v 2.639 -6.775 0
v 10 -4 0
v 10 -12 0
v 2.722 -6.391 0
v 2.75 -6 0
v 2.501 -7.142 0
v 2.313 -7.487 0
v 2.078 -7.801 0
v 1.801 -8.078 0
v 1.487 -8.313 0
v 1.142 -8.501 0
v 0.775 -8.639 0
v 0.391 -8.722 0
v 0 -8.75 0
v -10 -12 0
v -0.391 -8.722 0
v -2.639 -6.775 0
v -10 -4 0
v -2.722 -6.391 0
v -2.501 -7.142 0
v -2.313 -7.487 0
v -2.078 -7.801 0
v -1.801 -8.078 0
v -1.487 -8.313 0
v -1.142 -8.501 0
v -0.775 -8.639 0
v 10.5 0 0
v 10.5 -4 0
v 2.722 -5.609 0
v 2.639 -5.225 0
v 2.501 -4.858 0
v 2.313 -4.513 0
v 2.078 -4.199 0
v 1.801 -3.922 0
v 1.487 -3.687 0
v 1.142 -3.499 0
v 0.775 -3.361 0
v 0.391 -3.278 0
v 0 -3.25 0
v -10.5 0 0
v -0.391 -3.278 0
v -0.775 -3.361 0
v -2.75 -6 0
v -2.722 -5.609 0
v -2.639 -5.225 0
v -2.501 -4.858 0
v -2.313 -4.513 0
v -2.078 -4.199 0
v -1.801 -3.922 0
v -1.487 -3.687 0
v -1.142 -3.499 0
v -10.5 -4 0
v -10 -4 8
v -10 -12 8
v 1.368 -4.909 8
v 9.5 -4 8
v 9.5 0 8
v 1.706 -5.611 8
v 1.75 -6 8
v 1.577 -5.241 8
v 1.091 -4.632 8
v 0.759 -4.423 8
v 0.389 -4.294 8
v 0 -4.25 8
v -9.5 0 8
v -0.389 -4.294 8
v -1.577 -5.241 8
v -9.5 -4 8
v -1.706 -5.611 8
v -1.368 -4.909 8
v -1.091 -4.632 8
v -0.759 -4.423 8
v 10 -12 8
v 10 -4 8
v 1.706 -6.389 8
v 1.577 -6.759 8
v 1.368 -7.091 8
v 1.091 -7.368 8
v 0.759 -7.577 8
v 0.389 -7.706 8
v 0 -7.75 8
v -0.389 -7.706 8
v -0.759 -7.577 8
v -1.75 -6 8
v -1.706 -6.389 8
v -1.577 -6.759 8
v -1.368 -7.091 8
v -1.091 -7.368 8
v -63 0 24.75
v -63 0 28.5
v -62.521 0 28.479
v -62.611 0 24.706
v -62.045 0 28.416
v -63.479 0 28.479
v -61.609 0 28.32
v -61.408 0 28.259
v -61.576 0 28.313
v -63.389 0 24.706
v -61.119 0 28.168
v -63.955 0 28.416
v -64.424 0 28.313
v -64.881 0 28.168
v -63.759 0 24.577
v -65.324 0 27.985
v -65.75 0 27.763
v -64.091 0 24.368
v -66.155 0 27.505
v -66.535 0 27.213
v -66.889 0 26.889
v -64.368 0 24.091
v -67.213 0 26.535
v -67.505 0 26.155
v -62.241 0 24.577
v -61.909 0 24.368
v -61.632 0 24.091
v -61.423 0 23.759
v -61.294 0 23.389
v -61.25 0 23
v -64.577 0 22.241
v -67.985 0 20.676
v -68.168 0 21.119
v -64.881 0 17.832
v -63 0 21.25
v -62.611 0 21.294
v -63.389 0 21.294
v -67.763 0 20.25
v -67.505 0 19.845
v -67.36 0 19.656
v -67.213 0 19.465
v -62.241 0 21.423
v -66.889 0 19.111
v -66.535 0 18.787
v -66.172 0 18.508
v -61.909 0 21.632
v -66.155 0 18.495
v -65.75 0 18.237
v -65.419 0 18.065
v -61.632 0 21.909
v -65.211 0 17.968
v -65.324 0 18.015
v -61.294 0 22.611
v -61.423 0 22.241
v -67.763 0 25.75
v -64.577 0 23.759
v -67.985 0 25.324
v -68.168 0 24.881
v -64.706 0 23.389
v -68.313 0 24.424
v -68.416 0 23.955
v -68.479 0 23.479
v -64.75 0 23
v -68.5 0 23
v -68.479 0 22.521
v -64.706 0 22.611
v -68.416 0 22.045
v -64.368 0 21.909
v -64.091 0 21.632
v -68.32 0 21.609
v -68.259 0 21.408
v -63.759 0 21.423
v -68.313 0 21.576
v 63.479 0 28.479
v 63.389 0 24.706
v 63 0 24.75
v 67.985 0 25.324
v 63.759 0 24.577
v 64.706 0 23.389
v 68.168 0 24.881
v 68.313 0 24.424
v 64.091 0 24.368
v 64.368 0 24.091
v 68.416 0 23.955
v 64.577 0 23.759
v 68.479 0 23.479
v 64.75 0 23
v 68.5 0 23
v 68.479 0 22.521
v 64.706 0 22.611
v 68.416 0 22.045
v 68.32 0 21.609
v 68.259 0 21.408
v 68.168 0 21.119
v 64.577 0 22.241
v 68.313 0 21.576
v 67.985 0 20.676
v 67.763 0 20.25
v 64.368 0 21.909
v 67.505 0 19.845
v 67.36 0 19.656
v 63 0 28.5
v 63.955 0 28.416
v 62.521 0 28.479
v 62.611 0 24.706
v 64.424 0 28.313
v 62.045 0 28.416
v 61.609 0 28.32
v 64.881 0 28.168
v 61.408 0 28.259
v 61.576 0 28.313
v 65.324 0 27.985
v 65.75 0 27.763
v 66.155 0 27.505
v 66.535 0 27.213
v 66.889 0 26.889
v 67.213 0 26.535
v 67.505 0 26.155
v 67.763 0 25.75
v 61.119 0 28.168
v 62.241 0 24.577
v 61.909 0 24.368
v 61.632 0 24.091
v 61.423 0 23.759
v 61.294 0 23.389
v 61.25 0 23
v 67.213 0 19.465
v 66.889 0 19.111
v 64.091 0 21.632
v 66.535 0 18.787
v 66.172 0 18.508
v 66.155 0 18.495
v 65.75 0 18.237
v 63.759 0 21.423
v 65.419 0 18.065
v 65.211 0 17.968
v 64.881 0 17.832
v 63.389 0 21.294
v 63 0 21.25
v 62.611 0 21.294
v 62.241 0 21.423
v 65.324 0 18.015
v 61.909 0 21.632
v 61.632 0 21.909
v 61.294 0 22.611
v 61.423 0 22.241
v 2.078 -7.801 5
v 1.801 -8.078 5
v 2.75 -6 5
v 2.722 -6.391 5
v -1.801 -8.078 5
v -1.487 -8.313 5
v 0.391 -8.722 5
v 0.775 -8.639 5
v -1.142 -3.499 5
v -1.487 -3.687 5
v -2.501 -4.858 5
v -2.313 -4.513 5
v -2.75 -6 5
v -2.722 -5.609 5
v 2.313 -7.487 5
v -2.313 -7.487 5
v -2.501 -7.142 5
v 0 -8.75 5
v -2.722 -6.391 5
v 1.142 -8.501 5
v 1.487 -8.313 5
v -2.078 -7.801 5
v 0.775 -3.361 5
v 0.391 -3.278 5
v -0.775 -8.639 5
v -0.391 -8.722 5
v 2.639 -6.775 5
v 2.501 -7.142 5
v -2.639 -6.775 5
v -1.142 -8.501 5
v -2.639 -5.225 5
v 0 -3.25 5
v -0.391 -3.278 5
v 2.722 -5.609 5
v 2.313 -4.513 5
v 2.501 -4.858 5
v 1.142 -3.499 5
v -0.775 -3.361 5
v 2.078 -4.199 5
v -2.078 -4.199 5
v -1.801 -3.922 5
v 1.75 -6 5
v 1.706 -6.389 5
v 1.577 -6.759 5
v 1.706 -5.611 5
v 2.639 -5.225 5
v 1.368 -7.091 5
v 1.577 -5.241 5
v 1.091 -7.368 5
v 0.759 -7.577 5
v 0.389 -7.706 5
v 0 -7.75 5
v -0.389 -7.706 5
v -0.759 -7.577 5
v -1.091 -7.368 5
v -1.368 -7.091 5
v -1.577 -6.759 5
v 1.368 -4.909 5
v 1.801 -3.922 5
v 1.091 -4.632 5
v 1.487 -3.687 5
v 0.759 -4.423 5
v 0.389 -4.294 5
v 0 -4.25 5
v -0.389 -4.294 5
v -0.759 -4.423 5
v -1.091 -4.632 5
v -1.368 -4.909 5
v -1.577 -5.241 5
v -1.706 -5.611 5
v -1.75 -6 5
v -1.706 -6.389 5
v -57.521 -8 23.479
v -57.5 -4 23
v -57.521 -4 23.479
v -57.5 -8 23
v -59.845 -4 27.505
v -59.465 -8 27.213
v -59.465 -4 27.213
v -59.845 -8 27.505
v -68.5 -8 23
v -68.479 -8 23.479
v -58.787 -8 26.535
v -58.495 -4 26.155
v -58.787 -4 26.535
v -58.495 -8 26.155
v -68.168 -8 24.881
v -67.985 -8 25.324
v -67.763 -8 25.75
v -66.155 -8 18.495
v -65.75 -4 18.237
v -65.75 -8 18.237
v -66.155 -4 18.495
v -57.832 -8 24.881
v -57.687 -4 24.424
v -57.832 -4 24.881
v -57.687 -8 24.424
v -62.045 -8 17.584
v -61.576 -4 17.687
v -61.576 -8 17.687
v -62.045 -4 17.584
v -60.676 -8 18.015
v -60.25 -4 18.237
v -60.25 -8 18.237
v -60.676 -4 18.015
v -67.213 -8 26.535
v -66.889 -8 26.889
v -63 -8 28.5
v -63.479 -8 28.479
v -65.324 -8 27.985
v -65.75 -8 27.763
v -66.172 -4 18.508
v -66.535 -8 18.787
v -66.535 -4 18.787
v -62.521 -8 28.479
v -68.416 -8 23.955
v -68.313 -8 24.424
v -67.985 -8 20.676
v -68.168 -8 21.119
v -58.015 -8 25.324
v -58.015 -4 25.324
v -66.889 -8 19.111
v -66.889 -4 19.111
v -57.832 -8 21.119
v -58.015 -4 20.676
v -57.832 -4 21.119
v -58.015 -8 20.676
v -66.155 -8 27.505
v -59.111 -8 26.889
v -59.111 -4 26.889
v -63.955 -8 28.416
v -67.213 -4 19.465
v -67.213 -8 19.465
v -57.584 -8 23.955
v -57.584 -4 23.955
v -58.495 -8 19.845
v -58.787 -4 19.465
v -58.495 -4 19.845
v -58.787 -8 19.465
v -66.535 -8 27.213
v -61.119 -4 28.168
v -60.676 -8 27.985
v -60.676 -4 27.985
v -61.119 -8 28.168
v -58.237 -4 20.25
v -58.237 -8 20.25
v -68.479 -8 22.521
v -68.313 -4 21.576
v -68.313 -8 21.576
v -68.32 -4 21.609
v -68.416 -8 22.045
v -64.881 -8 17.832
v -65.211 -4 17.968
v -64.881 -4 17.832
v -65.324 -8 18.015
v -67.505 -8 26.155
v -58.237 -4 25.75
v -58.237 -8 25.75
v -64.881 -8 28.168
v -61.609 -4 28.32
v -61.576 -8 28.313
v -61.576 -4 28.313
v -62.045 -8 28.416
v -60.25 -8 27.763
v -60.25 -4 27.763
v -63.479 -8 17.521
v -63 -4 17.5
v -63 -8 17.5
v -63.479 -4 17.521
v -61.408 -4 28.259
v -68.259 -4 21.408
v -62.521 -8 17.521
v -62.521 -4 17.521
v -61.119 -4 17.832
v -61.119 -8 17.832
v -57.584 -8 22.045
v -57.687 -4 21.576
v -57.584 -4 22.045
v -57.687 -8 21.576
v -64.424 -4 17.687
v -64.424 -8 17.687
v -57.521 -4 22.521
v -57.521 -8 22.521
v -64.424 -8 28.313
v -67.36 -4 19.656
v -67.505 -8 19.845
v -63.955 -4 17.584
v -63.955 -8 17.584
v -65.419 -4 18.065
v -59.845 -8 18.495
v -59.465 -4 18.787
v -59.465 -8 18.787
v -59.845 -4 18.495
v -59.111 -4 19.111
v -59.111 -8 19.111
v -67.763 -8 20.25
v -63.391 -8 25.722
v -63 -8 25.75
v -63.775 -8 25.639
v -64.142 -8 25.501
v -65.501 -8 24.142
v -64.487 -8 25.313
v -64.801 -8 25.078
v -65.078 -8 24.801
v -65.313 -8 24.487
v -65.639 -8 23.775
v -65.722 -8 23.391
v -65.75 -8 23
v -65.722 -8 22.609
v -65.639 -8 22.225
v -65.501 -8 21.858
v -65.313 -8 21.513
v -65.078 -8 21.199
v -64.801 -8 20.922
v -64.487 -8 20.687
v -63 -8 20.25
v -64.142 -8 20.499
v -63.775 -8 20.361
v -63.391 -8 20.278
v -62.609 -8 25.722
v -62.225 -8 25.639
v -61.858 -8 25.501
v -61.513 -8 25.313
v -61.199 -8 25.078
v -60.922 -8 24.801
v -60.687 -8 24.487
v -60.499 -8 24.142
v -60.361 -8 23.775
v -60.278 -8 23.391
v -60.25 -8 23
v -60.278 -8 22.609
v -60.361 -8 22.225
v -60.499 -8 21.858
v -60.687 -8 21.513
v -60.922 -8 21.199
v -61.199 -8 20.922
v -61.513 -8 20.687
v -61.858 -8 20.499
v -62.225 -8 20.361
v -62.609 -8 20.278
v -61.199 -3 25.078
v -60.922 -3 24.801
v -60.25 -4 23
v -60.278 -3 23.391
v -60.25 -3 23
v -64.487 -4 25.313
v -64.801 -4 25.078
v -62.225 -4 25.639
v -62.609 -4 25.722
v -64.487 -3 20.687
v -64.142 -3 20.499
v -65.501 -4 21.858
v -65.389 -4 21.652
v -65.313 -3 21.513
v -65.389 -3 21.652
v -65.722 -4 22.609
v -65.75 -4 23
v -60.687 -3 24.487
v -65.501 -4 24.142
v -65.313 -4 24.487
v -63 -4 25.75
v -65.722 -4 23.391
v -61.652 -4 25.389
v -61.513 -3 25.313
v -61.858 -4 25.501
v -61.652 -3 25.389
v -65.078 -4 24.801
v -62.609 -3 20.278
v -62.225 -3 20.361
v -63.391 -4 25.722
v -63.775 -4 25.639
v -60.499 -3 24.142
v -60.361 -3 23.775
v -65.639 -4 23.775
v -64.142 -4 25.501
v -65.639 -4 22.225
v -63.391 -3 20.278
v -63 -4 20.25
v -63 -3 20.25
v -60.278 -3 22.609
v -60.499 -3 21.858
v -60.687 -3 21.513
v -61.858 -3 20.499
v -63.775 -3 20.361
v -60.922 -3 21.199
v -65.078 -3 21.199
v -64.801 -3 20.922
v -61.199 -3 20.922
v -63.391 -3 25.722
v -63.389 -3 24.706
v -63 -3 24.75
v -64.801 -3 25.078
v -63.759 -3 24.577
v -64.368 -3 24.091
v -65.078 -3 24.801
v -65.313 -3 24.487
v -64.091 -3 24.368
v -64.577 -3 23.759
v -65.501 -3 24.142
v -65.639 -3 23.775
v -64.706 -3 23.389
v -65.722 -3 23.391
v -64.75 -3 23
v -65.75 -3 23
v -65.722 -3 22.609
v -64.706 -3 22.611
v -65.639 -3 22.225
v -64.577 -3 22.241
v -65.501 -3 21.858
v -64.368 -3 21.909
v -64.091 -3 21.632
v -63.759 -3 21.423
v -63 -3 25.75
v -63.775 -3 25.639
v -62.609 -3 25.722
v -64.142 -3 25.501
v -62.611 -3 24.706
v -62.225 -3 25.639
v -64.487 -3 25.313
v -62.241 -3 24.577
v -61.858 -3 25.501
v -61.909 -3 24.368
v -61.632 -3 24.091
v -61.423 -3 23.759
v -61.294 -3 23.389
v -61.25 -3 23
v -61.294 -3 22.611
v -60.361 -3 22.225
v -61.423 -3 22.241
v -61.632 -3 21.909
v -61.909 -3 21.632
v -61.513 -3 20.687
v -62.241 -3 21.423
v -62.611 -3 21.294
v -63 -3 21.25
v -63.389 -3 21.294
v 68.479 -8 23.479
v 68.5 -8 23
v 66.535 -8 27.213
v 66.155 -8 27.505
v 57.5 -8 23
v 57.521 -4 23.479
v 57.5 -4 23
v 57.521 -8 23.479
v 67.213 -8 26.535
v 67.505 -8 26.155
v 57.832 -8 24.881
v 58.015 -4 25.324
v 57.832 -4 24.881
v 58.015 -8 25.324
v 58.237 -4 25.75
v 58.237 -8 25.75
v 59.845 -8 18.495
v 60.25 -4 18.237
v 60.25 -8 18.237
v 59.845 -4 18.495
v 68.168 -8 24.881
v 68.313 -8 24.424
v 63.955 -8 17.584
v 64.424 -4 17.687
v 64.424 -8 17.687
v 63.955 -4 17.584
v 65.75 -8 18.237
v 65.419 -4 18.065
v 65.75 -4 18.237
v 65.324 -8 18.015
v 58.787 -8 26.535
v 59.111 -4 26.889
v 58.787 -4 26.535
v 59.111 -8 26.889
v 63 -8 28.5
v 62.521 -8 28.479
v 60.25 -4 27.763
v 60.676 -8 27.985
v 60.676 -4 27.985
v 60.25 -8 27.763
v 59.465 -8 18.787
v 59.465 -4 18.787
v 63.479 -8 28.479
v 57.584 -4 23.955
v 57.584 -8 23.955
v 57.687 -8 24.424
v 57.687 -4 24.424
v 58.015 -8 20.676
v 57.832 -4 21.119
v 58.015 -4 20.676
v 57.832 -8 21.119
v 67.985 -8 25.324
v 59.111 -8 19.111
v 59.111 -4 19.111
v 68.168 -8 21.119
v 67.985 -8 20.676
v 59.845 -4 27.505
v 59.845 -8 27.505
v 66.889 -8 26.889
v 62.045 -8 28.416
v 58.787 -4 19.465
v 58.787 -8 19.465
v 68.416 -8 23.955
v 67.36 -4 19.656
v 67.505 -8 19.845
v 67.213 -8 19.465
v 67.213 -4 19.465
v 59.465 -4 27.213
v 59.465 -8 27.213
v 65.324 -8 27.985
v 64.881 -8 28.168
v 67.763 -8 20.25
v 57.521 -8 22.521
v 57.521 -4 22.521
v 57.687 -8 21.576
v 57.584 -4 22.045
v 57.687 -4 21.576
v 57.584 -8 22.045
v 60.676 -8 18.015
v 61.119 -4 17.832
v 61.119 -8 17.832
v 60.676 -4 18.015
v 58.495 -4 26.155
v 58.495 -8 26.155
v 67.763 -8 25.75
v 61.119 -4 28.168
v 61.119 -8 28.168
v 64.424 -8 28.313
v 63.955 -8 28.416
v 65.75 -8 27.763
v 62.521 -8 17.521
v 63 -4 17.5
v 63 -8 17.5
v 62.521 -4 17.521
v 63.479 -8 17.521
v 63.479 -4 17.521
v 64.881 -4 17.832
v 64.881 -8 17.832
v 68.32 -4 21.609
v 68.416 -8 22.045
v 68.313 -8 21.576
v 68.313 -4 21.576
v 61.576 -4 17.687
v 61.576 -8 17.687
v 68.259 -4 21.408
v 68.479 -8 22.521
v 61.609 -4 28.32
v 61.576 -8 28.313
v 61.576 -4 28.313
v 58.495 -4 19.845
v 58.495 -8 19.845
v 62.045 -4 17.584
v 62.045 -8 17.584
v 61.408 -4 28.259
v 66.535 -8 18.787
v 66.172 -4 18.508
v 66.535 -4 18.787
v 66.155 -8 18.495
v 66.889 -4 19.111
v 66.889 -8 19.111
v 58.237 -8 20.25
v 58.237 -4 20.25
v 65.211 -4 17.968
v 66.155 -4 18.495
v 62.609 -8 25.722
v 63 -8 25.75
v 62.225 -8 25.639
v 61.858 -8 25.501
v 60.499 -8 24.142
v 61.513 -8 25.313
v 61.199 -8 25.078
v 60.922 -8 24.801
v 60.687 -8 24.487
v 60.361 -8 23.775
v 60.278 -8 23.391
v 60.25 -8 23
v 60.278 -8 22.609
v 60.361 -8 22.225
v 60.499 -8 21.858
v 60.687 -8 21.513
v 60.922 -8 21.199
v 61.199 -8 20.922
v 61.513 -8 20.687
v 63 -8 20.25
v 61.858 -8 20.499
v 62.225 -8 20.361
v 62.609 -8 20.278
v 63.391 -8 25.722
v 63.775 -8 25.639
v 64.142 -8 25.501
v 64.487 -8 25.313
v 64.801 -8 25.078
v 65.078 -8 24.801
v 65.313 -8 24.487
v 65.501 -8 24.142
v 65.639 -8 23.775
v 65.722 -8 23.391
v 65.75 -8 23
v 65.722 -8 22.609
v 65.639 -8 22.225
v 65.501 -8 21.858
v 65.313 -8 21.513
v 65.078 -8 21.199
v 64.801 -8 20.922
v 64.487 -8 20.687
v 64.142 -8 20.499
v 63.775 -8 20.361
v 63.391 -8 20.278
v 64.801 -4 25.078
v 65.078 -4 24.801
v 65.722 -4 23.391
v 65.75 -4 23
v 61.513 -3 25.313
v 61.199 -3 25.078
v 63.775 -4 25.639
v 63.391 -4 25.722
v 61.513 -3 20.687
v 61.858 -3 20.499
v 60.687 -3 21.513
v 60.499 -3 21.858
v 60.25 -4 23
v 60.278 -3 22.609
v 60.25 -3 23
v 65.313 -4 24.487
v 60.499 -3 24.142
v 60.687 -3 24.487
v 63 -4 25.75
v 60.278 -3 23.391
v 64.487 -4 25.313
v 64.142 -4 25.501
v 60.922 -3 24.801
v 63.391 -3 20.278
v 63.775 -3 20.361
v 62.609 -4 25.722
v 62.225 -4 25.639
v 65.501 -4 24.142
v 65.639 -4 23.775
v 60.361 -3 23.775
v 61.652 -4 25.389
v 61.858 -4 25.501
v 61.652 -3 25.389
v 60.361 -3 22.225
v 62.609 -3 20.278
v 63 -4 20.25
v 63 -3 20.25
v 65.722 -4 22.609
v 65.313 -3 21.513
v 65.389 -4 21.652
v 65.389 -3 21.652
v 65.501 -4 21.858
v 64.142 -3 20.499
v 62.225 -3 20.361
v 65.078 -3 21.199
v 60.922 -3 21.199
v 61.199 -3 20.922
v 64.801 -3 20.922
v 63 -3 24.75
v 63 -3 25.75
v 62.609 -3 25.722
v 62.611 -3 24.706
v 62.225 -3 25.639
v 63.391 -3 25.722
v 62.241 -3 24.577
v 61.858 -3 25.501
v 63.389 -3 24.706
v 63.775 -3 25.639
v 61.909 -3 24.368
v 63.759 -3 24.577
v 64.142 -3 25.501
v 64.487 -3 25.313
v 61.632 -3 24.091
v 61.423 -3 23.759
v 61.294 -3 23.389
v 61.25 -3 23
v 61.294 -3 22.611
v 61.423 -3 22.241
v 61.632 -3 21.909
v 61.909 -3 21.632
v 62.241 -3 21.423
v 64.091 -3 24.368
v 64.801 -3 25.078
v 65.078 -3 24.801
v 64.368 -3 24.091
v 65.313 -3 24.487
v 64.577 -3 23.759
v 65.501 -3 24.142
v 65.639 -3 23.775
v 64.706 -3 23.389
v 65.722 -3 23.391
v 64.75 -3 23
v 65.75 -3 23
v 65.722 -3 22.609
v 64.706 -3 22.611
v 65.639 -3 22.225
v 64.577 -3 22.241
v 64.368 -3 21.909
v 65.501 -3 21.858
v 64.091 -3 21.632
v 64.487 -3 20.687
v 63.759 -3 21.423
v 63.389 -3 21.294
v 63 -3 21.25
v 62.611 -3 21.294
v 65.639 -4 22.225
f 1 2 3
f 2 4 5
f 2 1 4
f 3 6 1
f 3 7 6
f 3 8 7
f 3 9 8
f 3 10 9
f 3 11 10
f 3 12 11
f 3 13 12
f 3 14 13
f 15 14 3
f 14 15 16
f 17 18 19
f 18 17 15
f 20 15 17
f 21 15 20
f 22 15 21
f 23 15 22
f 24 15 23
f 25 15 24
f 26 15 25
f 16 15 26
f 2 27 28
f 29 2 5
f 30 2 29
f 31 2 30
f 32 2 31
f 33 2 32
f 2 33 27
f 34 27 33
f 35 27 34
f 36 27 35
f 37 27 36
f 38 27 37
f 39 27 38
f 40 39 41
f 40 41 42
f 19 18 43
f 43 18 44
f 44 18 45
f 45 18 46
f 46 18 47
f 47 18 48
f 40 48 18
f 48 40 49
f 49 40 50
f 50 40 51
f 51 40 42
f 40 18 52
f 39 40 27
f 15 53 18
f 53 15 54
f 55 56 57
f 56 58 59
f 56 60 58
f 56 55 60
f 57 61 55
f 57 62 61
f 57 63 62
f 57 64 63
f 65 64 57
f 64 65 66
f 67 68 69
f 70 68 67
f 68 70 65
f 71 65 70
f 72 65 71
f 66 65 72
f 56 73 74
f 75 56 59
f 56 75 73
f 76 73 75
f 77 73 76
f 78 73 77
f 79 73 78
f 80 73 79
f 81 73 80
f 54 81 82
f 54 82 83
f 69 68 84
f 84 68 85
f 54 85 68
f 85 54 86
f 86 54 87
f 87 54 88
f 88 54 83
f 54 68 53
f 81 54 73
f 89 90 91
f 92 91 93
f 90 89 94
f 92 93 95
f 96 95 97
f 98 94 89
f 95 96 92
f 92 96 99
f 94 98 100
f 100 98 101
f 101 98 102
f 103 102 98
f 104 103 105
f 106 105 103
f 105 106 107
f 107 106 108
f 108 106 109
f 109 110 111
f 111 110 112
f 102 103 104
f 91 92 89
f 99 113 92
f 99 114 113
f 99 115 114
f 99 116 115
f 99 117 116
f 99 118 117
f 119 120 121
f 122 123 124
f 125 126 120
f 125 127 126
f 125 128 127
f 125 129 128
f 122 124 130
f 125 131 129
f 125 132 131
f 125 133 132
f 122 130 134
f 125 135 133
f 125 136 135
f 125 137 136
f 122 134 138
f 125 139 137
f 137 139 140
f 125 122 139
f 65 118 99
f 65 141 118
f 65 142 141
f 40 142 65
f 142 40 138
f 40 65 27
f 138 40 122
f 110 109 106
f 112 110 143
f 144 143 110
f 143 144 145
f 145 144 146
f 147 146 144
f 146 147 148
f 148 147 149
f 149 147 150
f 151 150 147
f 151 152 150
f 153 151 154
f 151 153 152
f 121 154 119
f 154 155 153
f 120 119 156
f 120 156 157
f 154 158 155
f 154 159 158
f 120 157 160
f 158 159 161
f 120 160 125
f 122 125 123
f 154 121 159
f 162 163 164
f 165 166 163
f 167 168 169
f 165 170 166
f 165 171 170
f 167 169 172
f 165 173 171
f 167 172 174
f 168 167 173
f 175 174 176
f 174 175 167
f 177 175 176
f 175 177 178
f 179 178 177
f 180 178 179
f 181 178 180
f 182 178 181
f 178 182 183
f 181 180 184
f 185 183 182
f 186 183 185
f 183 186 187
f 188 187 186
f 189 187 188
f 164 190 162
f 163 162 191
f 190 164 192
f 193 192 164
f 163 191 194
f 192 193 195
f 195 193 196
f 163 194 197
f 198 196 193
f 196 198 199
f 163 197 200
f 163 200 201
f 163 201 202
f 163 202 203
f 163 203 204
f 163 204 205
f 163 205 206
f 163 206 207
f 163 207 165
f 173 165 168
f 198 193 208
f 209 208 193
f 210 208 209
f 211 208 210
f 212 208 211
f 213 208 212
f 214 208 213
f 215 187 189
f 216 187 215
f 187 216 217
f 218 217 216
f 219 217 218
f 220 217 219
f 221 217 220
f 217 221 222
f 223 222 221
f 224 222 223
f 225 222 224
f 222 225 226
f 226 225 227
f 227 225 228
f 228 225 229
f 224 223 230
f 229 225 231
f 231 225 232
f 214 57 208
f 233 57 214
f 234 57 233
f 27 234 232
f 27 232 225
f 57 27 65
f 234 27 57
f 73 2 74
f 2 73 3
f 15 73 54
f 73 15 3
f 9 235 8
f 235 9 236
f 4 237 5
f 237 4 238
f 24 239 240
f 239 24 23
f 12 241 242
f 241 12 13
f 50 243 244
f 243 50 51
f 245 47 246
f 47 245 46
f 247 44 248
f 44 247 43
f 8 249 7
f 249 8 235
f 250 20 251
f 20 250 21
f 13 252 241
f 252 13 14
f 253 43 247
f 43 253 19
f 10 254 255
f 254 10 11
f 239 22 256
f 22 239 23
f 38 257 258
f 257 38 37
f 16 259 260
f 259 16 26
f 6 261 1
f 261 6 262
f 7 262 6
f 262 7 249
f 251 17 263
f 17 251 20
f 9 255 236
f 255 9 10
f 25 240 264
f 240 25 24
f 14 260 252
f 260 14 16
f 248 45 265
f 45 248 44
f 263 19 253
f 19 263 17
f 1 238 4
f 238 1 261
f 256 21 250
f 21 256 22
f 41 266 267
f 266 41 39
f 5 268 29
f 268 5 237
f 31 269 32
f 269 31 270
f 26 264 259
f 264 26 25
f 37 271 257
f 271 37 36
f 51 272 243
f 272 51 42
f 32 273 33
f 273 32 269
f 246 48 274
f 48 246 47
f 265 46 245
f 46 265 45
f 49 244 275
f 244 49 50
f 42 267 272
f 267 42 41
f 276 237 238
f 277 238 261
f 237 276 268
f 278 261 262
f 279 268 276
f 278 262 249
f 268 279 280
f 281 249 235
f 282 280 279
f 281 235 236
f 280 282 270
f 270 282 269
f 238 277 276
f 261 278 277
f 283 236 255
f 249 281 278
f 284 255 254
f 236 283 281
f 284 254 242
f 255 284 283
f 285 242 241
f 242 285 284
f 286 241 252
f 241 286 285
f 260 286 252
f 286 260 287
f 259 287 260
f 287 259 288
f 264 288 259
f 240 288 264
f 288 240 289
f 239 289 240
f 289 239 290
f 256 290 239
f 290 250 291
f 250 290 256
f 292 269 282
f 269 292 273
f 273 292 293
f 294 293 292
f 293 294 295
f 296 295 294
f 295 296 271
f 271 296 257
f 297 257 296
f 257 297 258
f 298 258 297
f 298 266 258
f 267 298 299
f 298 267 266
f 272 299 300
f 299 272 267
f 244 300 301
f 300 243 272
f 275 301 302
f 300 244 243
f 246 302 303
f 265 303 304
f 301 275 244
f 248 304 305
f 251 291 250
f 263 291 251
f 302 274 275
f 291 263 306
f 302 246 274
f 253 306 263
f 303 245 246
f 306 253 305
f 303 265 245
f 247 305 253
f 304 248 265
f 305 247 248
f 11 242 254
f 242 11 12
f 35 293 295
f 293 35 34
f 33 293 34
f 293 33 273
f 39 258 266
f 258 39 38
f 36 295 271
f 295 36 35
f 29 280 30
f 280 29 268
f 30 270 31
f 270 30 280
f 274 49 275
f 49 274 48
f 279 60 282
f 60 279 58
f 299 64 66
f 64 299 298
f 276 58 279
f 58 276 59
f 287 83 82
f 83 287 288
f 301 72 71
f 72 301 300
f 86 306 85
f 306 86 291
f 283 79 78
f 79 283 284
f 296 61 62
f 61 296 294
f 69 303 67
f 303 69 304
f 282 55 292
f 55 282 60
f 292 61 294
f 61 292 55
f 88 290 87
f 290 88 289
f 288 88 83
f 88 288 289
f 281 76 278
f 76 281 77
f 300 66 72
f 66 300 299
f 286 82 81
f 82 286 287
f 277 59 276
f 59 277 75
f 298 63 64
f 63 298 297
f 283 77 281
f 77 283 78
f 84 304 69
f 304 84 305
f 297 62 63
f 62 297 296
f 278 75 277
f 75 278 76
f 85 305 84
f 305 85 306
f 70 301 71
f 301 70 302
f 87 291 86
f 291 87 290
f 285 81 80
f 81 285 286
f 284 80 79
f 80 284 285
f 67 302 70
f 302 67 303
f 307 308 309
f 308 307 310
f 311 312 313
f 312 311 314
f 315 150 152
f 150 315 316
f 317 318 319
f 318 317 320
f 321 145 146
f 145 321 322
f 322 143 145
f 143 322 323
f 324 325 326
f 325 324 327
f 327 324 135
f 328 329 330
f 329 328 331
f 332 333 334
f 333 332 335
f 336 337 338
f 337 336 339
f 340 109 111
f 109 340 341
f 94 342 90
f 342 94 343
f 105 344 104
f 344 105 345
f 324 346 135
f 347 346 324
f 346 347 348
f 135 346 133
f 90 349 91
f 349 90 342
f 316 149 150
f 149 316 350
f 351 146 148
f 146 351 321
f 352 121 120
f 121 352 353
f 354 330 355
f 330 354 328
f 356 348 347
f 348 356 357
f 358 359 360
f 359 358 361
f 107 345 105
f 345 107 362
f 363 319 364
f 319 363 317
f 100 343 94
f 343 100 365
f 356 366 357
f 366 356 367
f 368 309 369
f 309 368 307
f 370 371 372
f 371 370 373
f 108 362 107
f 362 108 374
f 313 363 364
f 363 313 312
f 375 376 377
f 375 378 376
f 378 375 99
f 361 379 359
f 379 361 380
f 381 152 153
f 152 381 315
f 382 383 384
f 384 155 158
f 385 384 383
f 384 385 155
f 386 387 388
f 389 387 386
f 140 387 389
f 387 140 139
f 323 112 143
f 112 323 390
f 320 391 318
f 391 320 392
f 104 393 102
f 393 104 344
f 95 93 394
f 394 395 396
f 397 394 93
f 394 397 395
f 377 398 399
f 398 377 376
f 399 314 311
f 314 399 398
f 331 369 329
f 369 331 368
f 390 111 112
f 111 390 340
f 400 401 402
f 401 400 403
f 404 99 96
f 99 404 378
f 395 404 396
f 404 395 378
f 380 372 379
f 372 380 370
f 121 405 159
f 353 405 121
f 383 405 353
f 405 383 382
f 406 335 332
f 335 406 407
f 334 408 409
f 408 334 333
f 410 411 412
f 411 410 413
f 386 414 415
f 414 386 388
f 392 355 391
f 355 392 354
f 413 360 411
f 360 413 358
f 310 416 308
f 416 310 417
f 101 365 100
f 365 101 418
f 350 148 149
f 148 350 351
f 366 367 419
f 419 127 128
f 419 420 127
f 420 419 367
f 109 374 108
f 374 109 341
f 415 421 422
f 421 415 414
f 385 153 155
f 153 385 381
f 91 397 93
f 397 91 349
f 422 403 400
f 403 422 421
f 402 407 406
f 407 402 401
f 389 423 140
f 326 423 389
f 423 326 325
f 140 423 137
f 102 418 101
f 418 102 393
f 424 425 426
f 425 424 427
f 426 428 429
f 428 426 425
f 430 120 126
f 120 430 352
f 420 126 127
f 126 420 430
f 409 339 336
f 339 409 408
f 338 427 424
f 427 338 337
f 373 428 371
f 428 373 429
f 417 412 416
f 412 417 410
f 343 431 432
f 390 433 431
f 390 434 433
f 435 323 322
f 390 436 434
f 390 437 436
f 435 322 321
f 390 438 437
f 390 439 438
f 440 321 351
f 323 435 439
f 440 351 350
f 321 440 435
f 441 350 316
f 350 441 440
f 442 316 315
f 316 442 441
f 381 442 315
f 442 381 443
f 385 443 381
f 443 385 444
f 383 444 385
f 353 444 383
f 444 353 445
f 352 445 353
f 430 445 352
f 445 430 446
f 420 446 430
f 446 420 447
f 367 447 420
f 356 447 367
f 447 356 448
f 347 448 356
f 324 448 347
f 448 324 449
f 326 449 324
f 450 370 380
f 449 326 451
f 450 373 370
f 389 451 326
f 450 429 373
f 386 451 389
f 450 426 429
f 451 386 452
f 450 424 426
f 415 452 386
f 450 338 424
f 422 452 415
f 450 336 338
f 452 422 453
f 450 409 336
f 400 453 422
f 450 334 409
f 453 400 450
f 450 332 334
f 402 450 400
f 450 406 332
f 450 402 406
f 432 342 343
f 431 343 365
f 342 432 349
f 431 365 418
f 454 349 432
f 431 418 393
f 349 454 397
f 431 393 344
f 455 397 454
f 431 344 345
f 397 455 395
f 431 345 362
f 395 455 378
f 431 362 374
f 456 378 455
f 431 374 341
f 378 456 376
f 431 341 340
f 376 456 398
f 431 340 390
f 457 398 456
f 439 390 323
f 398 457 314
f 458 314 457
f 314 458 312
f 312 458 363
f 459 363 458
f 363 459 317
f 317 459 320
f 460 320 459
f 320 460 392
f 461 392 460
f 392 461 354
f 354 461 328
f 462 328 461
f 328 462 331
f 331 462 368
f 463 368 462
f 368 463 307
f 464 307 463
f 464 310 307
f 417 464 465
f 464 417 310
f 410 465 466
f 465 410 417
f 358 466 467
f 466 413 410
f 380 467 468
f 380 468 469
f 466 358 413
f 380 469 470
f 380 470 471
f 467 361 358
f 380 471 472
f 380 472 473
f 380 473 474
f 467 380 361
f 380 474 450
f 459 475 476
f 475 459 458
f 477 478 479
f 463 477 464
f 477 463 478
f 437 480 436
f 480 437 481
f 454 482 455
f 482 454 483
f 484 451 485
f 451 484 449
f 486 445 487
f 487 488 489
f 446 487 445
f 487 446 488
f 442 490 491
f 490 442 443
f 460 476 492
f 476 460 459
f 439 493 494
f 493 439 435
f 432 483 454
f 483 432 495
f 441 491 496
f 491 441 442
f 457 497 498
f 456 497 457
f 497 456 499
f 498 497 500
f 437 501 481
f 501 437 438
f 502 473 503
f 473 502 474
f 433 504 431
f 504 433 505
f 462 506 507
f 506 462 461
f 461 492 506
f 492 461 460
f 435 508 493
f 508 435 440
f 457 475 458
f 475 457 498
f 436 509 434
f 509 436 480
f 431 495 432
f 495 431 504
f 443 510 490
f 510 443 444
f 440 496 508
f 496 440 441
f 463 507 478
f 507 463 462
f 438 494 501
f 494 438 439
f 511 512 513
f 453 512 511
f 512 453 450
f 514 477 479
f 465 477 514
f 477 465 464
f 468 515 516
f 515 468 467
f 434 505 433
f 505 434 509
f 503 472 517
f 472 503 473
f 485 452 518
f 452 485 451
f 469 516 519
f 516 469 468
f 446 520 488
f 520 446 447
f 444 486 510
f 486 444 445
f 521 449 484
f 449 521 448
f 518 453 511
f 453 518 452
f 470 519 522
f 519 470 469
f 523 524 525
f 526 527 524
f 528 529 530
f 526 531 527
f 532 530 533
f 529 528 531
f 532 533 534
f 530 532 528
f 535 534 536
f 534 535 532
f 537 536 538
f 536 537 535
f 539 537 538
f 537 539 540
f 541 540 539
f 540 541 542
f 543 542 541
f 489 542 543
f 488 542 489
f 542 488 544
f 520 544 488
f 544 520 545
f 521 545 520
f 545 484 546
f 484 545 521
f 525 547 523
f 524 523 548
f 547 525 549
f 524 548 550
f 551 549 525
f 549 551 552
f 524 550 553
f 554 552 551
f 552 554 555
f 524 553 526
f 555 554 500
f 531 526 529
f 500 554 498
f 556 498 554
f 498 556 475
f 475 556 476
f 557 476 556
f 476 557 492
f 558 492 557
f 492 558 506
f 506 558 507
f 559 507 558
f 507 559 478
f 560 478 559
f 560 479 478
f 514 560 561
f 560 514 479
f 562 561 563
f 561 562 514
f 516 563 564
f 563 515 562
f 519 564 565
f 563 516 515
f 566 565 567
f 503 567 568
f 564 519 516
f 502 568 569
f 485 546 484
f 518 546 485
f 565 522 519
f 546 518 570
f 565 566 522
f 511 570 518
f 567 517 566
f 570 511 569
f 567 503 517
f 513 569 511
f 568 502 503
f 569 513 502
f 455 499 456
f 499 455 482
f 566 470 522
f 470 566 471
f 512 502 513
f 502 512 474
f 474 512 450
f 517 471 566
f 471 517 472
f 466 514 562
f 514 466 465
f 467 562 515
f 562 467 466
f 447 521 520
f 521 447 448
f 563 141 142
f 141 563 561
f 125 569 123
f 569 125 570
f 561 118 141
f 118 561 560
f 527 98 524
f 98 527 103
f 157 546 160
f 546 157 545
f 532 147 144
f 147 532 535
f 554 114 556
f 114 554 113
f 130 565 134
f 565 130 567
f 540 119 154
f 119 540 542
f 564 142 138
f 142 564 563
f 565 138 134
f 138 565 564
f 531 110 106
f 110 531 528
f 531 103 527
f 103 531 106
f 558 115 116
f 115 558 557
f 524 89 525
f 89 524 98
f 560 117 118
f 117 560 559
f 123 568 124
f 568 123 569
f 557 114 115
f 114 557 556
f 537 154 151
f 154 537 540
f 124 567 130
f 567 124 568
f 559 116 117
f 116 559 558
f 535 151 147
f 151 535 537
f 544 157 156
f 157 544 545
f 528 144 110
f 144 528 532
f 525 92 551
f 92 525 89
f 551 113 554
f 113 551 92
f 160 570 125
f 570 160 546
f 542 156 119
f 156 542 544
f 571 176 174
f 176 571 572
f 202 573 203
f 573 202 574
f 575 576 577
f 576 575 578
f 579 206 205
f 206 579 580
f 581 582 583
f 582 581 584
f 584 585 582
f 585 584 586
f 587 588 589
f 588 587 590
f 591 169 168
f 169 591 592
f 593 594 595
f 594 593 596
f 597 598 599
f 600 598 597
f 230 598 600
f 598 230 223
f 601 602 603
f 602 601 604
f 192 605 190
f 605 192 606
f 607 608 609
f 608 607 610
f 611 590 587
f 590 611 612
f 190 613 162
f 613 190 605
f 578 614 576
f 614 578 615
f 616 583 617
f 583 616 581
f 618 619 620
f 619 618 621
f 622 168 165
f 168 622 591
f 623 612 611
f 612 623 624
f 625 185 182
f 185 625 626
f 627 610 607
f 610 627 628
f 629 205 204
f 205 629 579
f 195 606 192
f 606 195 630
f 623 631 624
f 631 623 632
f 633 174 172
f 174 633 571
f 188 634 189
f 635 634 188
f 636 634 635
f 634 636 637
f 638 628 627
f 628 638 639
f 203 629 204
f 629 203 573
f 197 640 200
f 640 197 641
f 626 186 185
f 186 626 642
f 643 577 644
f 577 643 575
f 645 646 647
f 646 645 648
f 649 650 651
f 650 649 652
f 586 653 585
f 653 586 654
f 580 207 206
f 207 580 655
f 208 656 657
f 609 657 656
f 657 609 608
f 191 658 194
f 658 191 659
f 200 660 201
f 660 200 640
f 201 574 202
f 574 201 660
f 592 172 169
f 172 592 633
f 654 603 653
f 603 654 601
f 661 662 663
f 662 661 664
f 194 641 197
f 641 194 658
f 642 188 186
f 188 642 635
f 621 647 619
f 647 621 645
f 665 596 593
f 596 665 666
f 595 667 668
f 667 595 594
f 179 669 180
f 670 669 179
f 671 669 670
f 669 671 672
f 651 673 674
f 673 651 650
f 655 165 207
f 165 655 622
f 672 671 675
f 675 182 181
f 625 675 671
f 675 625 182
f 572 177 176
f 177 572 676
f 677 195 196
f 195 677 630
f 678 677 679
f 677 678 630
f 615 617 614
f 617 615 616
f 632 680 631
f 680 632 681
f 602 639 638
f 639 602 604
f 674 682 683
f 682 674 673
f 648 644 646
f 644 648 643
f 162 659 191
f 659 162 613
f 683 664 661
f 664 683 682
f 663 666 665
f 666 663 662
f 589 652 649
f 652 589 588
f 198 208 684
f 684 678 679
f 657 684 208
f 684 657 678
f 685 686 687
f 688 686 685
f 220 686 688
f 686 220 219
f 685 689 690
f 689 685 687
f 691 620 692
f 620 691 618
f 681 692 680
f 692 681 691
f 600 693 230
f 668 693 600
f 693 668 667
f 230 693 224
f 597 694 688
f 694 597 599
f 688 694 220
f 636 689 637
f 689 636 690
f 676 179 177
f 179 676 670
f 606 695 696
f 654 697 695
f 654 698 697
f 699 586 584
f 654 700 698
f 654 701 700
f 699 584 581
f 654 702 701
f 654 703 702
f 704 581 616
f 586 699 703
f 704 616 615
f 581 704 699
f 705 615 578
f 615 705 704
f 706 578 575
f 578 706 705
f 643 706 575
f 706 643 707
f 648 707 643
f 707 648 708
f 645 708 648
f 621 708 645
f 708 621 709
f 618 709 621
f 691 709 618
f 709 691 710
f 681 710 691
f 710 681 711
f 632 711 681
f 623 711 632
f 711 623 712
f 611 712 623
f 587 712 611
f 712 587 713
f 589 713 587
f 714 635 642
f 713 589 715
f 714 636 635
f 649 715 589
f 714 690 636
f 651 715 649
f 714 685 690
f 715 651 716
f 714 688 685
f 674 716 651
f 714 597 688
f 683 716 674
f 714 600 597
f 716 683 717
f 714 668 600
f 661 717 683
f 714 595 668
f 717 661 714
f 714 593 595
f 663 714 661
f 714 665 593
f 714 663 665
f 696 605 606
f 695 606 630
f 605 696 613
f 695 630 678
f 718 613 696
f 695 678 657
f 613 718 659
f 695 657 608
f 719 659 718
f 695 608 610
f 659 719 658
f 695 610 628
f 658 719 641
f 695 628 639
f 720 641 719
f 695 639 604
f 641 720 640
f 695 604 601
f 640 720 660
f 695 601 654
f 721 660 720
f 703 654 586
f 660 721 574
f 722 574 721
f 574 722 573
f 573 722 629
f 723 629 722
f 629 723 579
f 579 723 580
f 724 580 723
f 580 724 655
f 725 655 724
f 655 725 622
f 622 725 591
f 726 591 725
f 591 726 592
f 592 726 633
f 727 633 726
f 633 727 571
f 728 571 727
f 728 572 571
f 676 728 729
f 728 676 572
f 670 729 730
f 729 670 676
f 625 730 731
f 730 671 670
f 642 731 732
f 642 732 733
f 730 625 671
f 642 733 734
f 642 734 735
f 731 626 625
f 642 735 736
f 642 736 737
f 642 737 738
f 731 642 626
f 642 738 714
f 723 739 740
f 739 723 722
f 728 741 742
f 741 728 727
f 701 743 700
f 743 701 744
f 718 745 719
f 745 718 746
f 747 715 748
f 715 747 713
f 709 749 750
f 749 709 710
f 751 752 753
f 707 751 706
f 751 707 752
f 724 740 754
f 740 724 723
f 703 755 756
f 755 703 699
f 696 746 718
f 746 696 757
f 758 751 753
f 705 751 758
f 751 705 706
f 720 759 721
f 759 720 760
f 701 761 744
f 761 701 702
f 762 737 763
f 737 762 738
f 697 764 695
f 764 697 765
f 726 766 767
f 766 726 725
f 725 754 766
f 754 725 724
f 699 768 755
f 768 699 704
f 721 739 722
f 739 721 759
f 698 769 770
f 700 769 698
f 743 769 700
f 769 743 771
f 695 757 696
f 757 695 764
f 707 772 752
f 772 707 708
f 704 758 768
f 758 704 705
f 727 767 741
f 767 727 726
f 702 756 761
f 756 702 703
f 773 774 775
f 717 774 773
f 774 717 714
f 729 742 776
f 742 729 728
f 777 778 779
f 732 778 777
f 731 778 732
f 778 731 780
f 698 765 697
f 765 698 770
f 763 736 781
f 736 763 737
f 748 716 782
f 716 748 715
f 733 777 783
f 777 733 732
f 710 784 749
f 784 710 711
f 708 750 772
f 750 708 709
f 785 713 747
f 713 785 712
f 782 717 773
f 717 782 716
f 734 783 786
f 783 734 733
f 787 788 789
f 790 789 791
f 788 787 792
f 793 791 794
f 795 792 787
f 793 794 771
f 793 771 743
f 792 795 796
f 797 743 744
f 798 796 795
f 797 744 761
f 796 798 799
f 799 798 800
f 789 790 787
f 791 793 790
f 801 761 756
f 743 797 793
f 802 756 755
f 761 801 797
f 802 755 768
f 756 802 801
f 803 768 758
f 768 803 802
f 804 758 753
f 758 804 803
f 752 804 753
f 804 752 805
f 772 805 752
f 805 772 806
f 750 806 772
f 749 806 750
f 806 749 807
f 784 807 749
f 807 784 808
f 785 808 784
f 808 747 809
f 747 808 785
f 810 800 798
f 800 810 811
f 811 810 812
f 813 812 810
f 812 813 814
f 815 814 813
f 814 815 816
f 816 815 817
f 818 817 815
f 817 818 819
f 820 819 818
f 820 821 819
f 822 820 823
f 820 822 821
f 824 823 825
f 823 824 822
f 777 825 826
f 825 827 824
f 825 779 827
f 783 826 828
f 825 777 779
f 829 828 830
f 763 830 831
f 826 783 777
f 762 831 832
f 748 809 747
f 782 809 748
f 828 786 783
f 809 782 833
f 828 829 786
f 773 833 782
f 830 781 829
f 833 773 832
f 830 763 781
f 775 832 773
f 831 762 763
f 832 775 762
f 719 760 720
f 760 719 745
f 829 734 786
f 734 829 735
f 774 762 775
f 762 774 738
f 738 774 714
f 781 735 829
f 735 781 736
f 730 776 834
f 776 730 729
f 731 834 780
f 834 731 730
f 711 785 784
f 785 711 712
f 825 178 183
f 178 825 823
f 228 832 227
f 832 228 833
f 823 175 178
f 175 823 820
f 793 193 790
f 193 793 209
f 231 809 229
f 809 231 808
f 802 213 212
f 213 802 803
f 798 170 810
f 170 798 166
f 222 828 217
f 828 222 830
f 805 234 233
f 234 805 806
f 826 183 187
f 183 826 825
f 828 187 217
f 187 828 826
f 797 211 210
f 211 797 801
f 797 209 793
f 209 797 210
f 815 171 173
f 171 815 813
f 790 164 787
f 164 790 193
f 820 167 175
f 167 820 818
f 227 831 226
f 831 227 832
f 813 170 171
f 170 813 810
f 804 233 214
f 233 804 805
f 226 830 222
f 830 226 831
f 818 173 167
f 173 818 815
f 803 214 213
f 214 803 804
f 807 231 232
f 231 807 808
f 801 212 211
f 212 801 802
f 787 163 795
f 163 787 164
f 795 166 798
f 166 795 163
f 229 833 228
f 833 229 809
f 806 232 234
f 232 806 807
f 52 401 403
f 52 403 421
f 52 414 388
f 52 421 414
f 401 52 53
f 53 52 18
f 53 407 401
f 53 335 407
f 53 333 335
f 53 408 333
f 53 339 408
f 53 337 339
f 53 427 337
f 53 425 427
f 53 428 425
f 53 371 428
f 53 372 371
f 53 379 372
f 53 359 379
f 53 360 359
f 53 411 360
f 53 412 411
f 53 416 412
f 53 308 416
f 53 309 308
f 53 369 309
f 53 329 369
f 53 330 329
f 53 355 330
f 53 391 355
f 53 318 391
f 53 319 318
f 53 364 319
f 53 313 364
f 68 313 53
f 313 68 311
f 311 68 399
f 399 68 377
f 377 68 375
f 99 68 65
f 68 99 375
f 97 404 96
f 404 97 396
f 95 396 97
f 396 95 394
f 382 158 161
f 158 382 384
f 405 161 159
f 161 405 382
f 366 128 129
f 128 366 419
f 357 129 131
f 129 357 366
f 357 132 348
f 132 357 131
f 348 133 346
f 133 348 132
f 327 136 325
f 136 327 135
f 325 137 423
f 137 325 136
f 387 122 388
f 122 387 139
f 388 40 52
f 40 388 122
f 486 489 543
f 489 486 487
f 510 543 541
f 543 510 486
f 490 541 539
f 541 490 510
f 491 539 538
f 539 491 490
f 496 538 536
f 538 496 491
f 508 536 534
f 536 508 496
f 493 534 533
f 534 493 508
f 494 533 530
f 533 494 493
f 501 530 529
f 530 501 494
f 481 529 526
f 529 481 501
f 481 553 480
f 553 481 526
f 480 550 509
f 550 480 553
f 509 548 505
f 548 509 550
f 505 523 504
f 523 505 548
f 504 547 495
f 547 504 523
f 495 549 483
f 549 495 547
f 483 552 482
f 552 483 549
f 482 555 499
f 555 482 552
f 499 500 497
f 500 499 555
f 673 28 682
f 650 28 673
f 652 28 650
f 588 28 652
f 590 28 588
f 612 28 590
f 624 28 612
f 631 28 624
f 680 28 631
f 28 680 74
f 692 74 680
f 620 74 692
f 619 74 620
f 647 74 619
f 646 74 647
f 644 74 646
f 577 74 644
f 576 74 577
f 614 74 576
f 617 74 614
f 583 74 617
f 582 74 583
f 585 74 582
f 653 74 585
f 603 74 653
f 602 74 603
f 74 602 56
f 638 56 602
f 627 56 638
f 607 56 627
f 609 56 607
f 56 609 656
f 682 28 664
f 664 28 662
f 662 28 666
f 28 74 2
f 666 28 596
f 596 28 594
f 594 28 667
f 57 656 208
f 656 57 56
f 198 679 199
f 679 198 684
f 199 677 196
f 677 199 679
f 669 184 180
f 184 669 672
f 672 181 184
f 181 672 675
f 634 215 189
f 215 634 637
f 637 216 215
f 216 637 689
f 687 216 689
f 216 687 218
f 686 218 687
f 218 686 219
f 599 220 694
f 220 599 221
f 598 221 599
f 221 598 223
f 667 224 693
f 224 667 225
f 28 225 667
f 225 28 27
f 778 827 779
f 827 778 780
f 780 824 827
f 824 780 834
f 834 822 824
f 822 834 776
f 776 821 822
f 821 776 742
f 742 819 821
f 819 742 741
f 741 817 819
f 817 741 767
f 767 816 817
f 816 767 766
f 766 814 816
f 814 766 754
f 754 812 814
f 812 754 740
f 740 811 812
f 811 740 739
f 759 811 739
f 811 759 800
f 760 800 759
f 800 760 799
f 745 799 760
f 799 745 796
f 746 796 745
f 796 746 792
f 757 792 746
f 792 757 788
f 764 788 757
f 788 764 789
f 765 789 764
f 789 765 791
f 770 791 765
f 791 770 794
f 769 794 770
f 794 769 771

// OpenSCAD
//$fn=60;
$fa=5;
$fs=.4;

insertDiameter = 5.5;
screwDiameter = 3.5;
armThickness = 4;
middleBodyHeight = 8;
baseToMountOffset = 15 + middleBodyHeight;

union(){
    middlebody();
    chasisMountSet();

    rotate([90,0,0]) union(){
        arm();
        mirror([1,0,0]) arm();
    }
}

module middlebody(){
    translate([0,-6,0])
    difference(){
        linear_extrude(height=middleBodyHeight) square([20,12],center=true);
        linear_extrude(height=5) circle(d=insertDiameter);
        linear_extrude(height=middleBodyHeight+1) circle(d=screwDiameter);
    }
}

module chasisMountSet(){
    translate([0,0,baseToMountOffset])
    union(){
        translate([-63,0,0]) chasismount();
        translate([63,0,0]) chasismount();
    }   
}

module chasismount(){
    translate([0,-4,0])
    rotate([-90,0,0])
    translate([0,0,-4])
    difference(){
        linear_extrude(height=8) circle(d=11);
        linear_extrude(height=5) circle(d=insertDiameter);
        linear_extrude(height=8) circle(d=screwDiameter);
    }
}

module arm(){
    linear_extrude(height=armThickness)
    difference(){
        hull(){
            translate([-10,middleBodyHeight/2]) square([1,middleBodyHeight],center=true);
            translate([-63,baseToMountOffset]) circle(d=11);
        }
        translate([-63,baseToMountOffset]) circle(d=insertDiameter);
    }
}
